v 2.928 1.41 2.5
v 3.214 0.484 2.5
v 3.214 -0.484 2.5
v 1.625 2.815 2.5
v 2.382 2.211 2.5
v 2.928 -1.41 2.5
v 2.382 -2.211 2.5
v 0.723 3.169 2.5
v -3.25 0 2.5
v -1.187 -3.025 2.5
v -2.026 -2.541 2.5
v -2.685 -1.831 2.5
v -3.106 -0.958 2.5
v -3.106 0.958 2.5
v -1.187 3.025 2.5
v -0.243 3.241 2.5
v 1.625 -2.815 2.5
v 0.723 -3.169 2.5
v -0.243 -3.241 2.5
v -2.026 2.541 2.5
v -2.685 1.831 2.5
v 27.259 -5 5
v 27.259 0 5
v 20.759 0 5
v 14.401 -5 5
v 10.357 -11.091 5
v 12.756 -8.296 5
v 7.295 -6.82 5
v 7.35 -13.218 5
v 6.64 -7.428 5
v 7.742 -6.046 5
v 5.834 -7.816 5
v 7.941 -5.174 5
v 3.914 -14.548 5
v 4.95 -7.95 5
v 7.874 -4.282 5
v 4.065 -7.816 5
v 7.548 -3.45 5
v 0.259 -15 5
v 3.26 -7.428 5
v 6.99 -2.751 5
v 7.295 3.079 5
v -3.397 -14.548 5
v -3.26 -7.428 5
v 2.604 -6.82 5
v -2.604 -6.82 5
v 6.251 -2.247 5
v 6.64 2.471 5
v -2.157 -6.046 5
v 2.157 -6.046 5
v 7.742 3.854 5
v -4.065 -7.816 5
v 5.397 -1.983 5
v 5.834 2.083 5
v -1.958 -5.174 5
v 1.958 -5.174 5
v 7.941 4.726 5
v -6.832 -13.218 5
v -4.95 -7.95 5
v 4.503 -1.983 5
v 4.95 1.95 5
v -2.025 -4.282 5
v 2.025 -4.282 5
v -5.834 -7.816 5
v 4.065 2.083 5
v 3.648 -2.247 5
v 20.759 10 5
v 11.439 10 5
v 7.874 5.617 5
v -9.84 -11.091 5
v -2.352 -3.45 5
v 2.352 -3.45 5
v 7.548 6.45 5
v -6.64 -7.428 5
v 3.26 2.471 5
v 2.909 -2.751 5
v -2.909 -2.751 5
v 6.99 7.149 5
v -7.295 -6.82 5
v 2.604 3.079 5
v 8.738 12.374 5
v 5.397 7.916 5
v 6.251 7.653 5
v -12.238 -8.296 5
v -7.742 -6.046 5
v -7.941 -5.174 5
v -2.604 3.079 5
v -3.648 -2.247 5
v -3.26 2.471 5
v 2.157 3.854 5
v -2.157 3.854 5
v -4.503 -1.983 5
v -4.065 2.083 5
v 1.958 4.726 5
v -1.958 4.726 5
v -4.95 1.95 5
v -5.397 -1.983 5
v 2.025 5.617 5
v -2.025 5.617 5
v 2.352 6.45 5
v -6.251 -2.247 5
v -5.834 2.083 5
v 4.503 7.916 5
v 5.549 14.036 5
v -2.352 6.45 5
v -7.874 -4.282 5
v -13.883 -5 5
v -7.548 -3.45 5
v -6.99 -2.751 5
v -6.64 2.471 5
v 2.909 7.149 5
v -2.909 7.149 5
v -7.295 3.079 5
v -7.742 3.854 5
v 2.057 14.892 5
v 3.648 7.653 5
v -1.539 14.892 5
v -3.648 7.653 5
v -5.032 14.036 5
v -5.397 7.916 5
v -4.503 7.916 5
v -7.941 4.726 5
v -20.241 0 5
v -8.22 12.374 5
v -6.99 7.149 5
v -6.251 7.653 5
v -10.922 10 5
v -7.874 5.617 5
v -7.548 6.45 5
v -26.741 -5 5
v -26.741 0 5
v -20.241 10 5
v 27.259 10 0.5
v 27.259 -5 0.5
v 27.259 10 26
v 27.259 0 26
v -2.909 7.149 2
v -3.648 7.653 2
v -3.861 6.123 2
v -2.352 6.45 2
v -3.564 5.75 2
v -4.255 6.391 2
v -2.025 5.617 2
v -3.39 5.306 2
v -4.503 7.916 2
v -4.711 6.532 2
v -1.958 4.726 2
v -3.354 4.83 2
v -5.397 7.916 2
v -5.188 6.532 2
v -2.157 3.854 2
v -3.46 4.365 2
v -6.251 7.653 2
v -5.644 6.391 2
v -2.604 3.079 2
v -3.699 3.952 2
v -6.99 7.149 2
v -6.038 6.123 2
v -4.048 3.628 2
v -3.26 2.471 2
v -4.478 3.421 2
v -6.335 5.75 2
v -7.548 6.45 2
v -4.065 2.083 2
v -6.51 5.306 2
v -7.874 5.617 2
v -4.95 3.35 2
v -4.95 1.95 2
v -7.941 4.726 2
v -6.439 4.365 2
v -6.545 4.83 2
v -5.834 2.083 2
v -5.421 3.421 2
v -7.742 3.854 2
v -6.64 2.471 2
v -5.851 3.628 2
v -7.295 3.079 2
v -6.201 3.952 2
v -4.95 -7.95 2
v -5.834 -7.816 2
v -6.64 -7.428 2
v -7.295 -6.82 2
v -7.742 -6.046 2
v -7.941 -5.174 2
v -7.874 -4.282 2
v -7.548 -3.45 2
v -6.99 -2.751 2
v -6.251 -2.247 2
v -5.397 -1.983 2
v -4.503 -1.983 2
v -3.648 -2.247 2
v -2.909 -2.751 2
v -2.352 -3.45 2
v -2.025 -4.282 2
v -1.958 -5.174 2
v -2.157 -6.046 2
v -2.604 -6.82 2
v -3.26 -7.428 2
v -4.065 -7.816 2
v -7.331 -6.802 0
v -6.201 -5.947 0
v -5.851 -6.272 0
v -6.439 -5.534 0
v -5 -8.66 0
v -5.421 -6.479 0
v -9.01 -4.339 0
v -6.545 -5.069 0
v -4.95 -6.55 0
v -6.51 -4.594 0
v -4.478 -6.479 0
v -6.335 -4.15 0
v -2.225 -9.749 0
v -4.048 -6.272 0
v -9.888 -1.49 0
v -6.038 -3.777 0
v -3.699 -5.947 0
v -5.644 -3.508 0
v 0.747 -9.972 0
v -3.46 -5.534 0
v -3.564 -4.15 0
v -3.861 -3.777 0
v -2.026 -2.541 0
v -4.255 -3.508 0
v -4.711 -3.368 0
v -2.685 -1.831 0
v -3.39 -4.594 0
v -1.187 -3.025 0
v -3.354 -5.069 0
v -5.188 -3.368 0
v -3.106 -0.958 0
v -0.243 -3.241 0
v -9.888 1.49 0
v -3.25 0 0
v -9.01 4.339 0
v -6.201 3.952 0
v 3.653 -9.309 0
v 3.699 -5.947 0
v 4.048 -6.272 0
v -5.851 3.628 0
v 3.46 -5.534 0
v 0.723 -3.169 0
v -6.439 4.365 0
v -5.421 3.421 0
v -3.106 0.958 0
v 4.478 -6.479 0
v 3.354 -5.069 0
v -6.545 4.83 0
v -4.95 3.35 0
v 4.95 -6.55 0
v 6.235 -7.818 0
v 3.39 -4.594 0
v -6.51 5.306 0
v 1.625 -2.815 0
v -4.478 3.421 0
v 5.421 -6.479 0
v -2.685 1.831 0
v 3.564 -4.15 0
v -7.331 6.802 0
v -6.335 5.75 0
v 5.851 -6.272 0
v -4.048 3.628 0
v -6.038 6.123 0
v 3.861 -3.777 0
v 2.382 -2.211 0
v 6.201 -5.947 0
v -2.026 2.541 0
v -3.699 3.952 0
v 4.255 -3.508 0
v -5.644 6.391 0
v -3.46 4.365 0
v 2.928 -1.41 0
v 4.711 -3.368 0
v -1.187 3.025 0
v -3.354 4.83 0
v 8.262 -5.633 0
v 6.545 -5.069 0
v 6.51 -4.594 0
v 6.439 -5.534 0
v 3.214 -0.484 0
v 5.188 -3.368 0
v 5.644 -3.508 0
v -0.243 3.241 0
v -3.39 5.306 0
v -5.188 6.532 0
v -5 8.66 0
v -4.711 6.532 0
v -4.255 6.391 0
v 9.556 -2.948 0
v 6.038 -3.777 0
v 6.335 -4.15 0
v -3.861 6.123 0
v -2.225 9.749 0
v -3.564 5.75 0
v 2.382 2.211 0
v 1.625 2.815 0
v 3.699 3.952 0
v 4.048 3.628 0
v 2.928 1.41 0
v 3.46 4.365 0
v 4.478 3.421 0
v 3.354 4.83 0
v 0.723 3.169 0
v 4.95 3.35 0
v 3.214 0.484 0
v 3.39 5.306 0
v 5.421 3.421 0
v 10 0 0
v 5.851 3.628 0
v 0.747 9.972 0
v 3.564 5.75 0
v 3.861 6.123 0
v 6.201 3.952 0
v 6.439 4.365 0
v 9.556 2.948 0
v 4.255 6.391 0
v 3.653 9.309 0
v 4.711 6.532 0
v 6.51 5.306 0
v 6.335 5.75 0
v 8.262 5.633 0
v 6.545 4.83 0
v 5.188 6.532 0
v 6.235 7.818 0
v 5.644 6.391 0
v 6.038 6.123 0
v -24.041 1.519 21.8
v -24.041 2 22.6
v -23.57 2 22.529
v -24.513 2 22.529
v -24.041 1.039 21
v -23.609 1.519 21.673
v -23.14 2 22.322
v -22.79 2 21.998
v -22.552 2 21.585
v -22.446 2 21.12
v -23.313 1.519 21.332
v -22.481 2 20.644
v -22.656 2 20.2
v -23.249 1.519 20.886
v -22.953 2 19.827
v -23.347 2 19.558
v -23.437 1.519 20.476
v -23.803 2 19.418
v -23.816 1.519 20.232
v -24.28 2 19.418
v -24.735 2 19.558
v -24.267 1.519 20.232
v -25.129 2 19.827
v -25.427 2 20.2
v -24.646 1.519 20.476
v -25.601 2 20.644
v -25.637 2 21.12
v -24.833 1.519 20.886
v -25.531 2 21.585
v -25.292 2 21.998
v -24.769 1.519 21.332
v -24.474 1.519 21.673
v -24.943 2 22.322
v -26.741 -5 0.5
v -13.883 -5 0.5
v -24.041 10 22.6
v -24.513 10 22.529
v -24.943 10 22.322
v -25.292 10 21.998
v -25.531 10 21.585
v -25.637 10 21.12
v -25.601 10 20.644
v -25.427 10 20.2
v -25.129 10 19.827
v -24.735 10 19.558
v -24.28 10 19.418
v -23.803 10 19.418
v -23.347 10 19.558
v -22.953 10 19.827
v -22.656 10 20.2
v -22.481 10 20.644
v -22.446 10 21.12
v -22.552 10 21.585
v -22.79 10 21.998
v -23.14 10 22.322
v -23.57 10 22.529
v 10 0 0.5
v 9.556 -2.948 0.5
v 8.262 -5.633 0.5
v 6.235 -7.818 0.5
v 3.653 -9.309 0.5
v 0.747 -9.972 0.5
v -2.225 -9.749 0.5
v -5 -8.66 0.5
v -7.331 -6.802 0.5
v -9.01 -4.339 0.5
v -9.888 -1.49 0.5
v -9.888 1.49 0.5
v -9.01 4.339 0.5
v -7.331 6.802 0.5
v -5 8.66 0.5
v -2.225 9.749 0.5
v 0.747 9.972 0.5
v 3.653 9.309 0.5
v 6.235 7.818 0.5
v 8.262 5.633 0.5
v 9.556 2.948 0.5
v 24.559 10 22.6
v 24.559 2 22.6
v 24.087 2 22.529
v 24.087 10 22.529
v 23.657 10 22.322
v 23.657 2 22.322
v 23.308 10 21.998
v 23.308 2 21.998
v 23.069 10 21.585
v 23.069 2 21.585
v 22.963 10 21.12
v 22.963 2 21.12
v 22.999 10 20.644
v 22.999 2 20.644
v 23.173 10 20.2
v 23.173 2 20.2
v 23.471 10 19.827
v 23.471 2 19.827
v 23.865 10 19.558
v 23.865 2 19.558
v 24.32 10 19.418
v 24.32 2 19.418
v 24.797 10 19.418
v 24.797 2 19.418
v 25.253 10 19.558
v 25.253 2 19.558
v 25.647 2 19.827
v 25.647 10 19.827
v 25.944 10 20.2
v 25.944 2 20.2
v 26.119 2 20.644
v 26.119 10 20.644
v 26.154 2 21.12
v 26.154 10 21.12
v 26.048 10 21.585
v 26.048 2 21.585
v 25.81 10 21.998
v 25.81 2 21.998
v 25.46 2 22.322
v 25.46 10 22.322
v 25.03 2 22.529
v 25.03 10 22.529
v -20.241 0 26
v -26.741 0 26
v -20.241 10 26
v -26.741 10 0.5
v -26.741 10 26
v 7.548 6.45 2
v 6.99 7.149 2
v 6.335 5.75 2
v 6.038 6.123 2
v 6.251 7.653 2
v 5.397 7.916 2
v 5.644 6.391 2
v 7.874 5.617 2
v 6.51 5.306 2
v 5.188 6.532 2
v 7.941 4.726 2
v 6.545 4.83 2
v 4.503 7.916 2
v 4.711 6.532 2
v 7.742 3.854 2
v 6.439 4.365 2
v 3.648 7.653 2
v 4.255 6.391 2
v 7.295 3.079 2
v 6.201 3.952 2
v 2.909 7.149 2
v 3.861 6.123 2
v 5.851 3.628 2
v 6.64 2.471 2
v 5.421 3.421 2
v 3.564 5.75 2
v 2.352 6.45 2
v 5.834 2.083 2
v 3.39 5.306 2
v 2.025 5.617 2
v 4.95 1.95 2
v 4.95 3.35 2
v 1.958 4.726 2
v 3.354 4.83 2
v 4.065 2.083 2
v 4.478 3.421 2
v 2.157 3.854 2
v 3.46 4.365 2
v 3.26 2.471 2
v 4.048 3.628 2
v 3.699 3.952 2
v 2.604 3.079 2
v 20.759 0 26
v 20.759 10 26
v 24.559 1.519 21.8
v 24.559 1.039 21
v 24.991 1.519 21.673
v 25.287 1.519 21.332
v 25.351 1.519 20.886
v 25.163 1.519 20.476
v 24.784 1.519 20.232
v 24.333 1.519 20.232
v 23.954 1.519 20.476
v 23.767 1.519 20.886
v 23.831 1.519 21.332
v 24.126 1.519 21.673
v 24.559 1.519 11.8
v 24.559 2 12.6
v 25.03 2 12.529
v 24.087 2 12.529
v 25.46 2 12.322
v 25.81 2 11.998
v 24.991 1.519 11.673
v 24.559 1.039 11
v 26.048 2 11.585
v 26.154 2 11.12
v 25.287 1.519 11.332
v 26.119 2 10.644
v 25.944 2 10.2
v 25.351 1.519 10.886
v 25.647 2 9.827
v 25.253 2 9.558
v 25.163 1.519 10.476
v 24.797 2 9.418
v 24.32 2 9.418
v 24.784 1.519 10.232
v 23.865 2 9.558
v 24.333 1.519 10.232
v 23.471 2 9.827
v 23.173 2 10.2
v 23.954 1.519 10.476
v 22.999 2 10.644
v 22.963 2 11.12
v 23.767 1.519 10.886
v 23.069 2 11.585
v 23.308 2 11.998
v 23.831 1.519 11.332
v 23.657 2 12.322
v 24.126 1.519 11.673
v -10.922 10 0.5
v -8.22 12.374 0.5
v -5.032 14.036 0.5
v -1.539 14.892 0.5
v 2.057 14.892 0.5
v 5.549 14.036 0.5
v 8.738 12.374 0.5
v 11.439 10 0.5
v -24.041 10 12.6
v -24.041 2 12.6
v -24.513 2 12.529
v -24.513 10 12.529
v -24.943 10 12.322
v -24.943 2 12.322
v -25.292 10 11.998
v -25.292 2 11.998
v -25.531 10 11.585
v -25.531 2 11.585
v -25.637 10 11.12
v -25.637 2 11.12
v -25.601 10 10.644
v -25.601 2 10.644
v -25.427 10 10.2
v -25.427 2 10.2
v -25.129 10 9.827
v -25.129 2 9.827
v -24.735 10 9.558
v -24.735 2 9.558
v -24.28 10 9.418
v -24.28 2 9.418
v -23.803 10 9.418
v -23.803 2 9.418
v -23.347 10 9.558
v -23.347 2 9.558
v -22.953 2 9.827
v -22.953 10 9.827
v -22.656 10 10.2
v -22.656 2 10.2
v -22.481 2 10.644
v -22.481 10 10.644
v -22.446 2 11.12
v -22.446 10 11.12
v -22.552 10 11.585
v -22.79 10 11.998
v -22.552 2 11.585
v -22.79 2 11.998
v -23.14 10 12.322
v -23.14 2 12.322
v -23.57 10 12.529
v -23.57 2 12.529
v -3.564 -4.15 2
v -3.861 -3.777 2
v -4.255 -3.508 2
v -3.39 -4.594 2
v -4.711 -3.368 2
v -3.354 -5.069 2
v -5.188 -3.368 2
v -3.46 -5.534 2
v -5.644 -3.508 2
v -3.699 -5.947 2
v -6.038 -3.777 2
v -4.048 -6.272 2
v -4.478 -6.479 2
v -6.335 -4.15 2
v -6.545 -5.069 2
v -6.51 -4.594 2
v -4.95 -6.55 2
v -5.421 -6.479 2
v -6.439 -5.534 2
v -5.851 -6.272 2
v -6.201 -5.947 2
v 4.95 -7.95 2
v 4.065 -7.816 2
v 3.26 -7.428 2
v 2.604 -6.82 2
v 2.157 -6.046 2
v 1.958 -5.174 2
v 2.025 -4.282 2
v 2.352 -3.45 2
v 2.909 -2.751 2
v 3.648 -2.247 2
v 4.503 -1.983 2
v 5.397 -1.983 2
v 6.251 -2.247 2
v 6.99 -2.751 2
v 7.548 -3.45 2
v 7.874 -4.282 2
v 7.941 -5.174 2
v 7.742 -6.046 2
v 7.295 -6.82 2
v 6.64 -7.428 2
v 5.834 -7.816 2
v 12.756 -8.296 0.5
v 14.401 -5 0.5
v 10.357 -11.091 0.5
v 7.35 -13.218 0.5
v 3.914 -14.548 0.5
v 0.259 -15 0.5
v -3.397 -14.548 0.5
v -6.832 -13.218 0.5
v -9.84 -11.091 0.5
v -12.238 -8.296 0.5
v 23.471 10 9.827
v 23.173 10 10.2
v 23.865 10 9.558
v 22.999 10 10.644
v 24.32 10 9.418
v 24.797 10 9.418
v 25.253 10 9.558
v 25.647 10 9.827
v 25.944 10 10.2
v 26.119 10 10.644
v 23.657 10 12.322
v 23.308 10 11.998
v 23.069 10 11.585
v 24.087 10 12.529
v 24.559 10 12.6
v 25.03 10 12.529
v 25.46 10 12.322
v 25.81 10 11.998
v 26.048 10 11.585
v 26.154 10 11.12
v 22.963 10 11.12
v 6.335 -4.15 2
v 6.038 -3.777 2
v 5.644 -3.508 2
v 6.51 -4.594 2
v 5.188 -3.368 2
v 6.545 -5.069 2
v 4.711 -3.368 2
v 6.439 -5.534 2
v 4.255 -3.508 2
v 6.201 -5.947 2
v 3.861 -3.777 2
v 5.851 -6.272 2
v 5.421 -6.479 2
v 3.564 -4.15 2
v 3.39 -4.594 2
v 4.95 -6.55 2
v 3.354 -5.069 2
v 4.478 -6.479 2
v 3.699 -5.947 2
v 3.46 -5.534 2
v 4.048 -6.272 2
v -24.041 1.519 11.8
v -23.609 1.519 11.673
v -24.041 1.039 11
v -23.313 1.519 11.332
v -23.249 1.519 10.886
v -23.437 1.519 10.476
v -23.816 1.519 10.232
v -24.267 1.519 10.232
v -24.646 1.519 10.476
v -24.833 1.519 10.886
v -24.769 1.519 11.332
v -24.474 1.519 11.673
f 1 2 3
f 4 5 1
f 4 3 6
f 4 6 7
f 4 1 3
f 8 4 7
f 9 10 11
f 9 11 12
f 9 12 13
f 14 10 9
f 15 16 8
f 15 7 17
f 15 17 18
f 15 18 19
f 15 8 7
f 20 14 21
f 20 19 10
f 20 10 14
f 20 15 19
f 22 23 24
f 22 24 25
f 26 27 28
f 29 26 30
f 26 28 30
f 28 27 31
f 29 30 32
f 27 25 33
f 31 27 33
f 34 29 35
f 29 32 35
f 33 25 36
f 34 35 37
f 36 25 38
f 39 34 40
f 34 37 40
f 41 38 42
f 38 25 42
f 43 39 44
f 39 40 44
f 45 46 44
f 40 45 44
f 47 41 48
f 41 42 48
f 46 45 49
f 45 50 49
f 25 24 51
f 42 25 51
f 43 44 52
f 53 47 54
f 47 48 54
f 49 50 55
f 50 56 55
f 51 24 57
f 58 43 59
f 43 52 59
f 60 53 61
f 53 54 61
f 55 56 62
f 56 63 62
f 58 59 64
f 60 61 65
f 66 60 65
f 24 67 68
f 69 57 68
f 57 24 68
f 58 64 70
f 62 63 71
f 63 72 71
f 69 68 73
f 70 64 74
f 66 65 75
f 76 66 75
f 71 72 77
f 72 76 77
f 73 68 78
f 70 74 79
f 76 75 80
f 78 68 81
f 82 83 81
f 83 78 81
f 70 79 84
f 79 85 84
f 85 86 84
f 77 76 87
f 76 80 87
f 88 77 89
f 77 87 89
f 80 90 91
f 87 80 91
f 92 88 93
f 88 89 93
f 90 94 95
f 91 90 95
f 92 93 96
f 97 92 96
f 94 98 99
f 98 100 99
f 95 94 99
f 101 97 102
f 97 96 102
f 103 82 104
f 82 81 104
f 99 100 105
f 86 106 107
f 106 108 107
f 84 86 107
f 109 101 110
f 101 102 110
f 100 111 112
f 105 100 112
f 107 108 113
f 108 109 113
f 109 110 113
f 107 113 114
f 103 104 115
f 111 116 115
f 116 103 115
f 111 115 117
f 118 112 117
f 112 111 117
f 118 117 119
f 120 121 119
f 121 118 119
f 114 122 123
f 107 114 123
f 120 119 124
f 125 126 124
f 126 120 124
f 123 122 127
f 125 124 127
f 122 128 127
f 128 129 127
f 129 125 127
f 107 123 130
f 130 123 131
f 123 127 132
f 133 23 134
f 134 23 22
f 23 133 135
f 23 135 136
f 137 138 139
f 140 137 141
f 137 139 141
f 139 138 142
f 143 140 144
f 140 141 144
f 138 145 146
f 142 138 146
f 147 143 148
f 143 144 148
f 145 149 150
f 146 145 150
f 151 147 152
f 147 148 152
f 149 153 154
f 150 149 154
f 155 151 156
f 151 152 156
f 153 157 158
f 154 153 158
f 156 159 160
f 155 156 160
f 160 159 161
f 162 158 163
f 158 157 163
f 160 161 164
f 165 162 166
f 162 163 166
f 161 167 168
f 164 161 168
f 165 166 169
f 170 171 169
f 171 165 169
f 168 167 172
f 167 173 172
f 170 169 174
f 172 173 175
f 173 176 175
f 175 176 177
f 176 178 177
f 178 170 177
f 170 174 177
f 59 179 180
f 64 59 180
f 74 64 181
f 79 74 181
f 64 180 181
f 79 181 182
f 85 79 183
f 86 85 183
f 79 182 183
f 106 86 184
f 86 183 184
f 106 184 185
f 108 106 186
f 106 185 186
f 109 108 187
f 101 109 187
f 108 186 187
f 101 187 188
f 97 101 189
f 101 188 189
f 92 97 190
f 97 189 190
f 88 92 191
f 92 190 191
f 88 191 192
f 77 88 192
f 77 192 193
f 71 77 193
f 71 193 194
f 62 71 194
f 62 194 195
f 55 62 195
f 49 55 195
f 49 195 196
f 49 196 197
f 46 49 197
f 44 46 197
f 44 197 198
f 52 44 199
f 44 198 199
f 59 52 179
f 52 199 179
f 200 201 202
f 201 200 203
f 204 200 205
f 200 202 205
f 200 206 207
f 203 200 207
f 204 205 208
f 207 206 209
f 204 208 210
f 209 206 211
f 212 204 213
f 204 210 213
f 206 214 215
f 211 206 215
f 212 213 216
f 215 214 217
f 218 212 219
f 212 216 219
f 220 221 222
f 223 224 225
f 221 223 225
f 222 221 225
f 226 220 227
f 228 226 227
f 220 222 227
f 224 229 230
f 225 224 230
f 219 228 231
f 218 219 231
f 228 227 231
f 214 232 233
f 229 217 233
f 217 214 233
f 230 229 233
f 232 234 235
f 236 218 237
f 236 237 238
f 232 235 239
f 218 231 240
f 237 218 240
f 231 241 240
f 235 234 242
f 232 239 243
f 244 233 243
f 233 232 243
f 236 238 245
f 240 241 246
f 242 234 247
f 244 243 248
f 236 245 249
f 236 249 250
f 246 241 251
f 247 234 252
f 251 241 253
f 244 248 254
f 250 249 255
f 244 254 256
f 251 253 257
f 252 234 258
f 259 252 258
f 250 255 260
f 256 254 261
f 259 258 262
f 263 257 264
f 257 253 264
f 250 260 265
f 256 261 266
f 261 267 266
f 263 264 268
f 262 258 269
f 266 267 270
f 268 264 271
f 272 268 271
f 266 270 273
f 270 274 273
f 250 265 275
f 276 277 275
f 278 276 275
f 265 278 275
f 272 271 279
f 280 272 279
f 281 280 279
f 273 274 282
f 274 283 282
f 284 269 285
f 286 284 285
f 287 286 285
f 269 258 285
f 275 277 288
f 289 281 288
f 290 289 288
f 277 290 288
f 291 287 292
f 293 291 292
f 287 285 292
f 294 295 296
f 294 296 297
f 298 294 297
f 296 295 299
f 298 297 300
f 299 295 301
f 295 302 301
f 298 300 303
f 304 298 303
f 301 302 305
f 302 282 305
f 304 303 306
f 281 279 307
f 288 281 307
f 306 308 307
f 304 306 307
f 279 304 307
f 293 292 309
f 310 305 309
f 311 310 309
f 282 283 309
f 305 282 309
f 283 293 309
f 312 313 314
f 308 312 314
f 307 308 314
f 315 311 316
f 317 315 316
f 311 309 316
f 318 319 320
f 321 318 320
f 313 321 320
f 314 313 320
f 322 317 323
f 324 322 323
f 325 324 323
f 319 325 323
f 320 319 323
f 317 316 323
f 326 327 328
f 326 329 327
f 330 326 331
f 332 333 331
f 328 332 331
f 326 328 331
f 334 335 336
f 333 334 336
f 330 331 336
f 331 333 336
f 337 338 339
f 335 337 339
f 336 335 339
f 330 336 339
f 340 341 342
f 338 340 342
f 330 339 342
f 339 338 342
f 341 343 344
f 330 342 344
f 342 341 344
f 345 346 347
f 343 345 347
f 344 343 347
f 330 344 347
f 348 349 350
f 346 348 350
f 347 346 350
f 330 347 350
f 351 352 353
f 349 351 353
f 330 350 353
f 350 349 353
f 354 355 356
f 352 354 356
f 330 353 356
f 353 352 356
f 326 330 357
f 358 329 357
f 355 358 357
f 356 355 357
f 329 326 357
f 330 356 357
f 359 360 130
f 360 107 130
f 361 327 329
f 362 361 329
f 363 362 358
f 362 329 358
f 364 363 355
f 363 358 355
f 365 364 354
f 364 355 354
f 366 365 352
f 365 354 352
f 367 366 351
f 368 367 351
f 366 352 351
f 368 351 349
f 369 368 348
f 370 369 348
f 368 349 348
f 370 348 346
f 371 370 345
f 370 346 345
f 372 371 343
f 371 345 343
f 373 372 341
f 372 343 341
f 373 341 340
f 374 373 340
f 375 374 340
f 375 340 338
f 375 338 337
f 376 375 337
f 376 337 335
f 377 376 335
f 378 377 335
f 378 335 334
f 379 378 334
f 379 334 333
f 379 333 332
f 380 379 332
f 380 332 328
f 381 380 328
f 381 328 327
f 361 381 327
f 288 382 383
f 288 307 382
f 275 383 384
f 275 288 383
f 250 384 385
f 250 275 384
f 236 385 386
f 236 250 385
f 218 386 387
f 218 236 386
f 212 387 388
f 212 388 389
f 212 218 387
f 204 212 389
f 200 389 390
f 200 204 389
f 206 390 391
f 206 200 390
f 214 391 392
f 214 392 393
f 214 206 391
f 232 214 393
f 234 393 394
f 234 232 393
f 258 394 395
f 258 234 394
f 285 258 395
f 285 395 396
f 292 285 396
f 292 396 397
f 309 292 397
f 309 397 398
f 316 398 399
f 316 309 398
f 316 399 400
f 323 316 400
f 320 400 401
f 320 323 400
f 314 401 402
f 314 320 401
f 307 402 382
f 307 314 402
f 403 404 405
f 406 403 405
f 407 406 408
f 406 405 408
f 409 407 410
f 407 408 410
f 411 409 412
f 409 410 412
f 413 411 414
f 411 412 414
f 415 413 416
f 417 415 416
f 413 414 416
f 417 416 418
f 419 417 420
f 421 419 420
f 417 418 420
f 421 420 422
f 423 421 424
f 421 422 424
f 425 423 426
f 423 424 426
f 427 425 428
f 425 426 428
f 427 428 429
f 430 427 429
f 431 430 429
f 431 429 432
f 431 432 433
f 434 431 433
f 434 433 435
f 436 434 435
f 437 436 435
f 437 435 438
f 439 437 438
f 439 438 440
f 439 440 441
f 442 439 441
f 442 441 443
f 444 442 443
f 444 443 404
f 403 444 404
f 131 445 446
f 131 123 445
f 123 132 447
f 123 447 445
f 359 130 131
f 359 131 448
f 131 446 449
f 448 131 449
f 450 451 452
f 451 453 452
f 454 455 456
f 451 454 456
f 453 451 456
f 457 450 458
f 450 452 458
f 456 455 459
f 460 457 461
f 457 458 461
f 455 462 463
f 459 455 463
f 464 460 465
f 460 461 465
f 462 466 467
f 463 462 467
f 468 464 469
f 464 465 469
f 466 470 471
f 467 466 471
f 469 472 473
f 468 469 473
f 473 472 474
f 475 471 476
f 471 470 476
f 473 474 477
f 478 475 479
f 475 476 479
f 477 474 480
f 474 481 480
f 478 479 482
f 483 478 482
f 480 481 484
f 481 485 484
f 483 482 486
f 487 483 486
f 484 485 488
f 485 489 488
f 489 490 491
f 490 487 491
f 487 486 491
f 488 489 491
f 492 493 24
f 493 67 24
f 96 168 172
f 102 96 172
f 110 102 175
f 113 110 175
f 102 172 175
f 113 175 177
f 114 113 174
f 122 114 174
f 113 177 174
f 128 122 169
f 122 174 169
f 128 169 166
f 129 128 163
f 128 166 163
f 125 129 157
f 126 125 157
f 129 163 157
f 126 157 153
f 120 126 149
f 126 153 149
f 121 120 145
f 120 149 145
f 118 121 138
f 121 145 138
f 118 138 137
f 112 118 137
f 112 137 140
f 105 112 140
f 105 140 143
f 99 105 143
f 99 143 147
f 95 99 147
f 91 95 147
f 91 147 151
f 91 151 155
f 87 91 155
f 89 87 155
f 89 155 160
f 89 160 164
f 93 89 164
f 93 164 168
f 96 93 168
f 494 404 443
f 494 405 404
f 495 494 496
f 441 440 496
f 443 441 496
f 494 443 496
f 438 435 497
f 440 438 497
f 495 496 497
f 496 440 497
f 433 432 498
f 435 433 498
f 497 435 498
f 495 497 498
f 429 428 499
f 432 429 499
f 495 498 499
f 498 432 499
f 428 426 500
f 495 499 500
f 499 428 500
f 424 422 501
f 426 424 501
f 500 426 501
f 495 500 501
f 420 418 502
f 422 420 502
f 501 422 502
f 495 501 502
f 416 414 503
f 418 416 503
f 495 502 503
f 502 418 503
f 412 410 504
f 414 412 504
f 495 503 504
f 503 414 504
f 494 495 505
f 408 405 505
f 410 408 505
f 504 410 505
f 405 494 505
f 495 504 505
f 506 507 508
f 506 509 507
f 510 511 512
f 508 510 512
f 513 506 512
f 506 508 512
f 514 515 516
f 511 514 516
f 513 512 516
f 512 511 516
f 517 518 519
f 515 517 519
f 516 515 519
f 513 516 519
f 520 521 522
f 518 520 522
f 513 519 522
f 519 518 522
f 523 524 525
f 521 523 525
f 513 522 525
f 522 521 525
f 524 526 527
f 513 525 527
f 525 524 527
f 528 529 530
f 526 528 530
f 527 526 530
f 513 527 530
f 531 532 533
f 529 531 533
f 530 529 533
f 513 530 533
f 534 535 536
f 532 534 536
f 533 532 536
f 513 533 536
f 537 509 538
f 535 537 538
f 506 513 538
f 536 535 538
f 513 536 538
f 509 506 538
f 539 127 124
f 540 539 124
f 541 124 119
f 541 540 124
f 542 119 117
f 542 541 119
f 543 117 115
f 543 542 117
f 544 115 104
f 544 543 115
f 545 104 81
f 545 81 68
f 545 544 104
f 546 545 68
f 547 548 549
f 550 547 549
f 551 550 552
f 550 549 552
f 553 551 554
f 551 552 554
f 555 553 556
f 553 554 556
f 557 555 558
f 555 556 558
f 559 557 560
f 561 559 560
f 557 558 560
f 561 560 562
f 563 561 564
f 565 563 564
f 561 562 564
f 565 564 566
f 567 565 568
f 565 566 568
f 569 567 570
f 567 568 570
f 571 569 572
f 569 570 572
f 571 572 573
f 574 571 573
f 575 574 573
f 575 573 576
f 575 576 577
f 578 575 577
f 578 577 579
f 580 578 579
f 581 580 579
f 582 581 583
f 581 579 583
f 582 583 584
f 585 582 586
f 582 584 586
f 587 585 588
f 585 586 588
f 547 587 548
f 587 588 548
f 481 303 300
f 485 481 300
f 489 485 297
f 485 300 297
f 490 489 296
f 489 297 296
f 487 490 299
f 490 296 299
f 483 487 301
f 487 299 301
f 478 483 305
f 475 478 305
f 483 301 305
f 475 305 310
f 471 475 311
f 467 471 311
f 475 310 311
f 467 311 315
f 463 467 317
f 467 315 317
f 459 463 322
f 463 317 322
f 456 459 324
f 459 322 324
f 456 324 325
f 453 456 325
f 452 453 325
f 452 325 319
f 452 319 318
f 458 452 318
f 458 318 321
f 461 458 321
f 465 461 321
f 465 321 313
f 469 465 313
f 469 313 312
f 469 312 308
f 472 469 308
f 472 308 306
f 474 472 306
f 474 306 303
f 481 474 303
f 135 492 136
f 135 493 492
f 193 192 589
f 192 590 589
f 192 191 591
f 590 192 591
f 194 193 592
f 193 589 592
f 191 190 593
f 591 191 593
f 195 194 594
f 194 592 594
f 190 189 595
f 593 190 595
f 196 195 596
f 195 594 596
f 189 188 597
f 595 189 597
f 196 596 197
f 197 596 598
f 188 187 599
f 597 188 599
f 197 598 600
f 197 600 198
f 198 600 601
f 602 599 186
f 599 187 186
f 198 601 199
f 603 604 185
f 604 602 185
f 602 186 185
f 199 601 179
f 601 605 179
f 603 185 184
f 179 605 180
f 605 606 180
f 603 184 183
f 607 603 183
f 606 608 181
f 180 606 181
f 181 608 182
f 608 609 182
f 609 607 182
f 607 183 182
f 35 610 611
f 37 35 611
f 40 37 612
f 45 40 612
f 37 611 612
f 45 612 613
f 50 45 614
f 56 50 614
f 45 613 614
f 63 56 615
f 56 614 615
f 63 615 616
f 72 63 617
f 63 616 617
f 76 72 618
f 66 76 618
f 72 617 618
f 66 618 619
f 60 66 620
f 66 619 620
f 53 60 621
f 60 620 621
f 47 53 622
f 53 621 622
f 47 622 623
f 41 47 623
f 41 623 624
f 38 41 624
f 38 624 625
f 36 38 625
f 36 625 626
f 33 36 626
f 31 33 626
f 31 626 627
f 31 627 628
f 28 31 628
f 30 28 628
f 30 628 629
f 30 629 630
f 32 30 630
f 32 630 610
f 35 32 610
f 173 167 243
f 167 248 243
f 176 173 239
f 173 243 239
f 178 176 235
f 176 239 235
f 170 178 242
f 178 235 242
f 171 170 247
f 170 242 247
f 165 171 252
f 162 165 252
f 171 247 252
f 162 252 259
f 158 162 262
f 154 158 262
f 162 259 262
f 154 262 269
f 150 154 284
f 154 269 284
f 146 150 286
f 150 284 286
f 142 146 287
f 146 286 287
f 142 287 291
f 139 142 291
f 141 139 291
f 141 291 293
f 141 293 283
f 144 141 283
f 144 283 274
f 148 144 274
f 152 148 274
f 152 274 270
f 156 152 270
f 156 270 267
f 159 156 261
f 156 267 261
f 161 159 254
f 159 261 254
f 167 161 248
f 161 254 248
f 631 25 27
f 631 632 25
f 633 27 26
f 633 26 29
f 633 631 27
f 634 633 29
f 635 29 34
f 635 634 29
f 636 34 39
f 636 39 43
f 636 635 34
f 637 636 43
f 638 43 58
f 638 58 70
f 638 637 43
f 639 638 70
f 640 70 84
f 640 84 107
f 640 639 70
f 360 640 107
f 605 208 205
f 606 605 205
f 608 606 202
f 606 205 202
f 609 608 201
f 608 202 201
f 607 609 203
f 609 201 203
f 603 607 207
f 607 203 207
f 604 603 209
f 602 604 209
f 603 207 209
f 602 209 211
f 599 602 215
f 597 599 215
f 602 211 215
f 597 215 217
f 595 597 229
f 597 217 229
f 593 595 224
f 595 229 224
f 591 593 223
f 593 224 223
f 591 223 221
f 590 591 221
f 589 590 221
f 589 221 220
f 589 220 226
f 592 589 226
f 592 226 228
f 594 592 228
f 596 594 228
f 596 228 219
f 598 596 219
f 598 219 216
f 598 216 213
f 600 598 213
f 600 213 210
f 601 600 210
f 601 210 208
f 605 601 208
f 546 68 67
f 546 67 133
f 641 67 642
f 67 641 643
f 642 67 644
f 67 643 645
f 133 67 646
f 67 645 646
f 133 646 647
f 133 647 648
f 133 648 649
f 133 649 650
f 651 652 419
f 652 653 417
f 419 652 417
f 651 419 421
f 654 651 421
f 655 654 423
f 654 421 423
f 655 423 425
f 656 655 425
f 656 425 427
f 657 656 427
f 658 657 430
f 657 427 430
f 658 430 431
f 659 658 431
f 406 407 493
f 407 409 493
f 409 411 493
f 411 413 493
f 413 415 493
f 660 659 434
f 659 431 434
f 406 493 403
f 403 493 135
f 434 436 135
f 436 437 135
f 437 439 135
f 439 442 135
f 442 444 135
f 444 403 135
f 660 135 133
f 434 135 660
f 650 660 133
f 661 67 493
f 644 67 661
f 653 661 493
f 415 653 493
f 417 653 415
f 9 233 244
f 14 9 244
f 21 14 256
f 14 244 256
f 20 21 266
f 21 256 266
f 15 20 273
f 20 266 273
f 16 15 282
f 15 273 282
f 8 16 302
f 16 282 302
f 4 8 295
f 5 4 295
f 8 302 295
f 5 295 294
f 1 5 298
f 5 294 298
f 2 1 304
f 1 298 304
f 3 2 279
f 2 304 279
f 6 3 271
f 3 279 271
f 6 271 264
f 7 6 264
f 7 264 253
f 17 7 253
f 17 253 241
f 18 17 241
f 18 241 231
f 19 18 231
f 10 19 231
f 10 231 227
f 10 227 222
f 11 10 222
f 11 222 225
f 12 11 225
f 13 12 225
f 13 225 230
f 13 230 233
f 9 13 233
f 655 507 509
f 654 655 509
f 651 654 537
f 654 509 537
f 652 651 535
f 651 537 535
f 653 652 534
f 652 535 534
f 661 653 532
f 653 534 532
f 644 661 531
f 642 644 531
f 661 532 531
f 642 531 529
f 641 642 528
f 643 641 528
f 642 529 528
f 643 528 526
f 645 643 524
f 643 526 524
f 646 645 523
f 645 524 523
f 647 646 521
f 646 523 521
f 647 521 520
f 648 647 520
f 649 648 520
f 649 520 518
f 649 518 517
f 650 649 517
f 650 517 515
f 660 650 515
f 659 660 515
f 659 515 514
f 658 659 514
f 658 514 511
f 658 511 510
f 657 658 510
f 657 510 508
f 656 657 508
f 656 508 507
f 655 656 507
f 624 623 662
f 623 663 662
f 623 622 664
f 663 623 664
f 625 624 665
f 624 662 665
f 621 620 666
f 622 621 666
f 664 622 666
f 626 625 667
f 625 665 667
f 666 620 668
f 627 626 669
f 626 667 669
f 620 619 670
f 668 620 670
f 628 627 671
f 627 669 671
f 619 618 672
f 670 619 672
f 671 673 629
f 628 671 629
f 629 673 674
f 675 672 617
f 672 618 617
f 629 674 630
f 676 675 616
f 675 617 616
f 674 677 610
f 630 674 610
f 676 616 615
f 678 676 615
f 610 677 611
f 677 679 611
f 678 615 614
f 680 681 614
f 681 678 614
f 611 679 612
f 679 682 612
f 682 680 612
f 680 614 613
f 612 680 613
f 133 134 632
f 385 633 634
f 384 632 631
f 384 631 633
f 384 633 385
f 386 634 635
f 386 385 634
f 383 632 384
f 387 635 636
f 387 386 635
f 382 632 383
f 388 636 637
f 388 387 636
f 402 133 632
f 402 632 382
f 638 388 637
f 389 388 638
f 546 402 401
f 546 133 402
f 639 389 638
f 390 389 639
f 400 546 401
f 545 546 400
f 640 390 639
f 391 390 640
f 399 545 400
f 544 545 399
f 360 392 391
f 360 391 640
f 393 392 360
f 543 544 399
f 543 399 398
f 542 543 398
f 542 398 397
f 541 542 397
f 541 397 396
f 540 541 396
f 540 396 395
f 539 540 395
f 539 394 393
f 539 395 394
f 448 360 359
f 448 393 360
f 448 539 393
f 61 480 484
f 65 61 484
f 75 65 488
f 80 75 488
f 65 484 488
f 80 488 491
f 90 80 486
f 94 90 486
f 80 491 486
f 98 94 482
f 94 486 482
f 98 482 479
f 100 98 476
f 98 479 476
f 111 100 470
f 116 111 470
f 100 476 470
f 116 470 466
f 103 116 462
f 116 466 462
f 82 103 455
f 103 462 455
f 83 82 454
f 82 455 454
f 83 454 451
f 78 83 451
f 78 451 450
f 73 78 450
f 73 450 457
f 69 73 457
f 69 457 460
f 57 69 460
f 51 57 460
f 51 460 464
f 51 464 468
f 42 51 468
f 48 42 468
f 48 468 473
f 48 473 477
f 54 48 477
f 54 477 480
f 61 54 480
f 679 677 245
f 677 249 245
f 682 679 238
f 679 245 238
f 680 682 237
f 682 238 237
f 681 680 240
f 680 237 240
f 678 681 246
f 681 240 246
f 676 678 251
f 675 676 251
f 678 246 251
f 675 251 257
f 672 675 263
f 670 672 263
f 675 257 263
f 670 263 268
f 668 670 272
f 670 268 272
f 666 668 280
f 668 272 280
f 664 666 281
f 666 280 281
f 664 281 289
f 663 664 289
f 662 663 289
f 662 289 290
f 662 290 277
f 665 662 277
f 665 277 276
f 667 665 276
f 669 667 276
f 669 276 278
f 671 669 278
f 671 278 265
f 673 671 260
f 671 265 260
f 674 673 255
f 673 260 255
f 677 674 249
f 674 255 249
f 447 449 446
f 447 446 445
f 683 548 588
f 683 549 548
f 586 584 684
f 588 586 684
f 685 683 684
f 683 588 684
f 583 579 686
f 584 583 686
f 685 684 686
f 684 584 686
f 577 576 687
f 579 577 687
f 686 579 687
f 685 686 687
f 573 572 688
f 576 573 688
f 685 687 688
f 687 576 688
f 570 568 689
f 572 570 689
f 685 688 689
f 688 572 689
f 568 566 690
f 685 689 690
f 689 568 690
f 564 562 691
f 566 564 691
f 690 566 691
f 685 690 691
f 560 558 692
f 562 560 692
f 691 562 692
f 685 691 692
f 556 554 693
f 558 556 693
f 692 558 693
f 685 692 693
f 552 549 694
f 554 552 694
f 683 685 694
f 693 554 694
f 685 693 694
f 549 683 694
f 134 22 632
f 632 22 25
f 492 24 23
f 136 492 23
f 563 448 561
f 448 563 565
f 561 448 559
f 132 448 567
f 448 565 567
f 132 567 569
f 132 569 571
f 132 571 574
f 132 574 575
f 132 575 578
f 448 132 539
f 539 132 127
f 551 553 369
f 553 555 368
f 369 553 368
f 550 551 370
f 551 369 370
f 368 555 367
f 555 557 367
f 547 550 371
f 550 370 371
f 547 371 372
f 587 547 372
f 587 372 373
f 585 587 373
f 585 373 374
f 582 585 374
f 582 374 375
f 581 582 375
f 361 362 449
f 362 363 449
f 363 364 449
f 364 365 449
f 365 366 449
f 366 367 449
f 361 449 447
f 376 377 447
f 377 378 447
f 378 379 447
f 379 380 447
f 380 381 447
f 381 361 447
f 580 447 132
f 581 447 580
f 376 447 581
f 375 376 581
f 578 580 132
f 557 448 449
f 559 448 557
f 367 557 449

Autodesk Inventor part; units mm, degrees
ref_plane "YZ Plane" through (0, 0, 0) normal (1, 0, 0) x (0, 1, 0)
ref_plane "XZ Plane" through (0, 0, 0) normal (0, 1, 0) x (-1, 0, 0)
sketch "草圖1" plane through (0, 0, 0) normal (0, 0, 1) x (1, 0, 0)
  circle A0 centre (0, 0) radius 10
  dimension "d0" = 20
extrude "擠出1" add sketch "草圖1" along normal blind 5
ref_plane "工作平面1" through (0, 0, 0.5) normal (0, 0, -1) x (-1, 0, 0)
sketch "草圖4" plane through (0, 0, 0.5) normal (0, 0, -1) x (-1, 0, 0)
  circle A0 centre (-0.2588, 0) radius 15
  point P0 (0, 0)
  dimension "d18" = 30
extrude "擠出3" add sketch "草圖4" against normal up to surface (4.5 mm away)
sketch "草圖2" plane through (0, 0, 5) normal (0, 0, 1) x (1, 0, 0)
  circle A0 centre (0, 0) radius 7
  line L0 (-4.9497, -4.9497) -> (4.9497, -4.9497)
  line L1 (4.9497, -4.9497) -> (4.9497, 4.9497)
  line L2 (4.9497, 4.9497) -> (-4.9497, 4.9497)
  line L3 (-4.9497, 4.9497) -> (-4.9497, -4.9497)
  line L4 (-4.9497, -4.9497) -> (4.9497, 4.9497) construction
  line L5 (4.9497, -4.9497) -> (-4.9497, 4.9497) construction
  dimension "d3" = 14
hole "孔1" at (4.9497, 4.9497, 5) at (-4.9497, 4.9497, 5) at (-4.9497, -4.9497, 5) at (4.9497, -4.9497, 5) direction (0, 0, -1) diameter 3.2 depth 8 tip angle 118 counterbore diameter 6 counterbore depth 3
sketch "草圖5" plane through (0.2588, 0, 5) normal (0, 0, 1) x (1, 0, 0)
  line L0 (-27, 10) -> (-10, 10)
  line L1 (-10, 10) -> (-10, -5)
  line L2 (-10, -5) -> (-27, -5)
  line L3 (-27, -5) -> (-27, 10)
  line L4 (10, 10) -> (27, 10)
  line L5 (27, 10) -> (27, -5)
  line L6 (27, -5) -> (10, -5)
  line L7 (10, -5) -> (10, 10)
  circle A0 centre (0, 0) radius 15 projected
  point P0 (-0.2588, 0)
  dimension "d21" = 10
  dimension "d22" = 10
  dimension "d23" = 10
  dimension "d24" = 15
  dimension "d27" = 17
  dimension "d28" = 17
extrude "擠出4" add sketch "草圖5" against normal up to surface (4.5 mm away) contours L0 A0 L2 L3 | L0 L1 L2 A0 | A0 L6 L7 L4 | L4 L5 L6 A0
sketch "草圖6" plane through (0, 0, 5) normal (0, 0, 1) x (1, 0, 0)
  line L0 (-26.7412, 10) -> (-10.9215, 10) projected
  line L1 (-26.7412, 10) -> (-20.2412, 10)
  line L2 (-20.2412, 10) -> (-20.2412, 0)
  line L3 (-20.2412, 0) -> (-26.7412, 0)
  line L4 (-26.7412, 0) -> (-26.7412, 10)
  line L5 (27.2588, 10) -> (27.2588, -5) projected
  line L6 (27.2588, 10) -> (20.7588, 10)
  line L7 (20.7588, 10) -> (20.7588, 0)
  line L8 (20.7588, 0) -> (27.2588, 0)
  line L9 (27.2588, 0) -> (27.2588, 10)
  point P0 (0, 0)
  dimension "d29" = 41
  dimension "d30" = 10
  dimension "d31" = 10
extrude "擠出5" add sketch "草圖6" along normal blind 21
sketch "草圖7" plane through (-26.7412, 10, 0.5) normal (0, 1, 0) x (1, 0, 0)
  line L0 (2.7, -10.5) -> (51.3, -10.5)
  line L1 (51.3, -10.5) -> (51.3, -20.5)
  line L2 (51.3, -20.5) -> (2.7, -20.5)
  line L3 (2.7, -20.5) -> (2.7, -10.5)
  line L4 (0, 0) -> (0, -25.5) projected
  line L5 (6.5, -25.5) -> (0, -25.5) projected
  point P0 (26.7412, 0.5)
  dimension "d34" = 48.6
  dimension "d35" = 2.7
  dimension "d36" = 5
  dimension "d37" = 10
hole "孔2" at (-24.0412, 10, 21) at (-24.0412, 10, 11) at (24.5588, 10, 21) at (24.5588, 10, 11) direction (0, -1, 0) diameter 3.2 depth 8 tip angle 118
sketch "草圖8" plane through (0, 0, 0) normal (0, 0, -1) x (-1, 0, 0)
  circle A0 centre (0, 0) radius 3.25
  dimension "d45" = 6.5
extrude "擠出6" cut sketch "草圖8" against normal blind 2.5
properties part number "腕-2" material "熱塑性塑膠樹脂"
